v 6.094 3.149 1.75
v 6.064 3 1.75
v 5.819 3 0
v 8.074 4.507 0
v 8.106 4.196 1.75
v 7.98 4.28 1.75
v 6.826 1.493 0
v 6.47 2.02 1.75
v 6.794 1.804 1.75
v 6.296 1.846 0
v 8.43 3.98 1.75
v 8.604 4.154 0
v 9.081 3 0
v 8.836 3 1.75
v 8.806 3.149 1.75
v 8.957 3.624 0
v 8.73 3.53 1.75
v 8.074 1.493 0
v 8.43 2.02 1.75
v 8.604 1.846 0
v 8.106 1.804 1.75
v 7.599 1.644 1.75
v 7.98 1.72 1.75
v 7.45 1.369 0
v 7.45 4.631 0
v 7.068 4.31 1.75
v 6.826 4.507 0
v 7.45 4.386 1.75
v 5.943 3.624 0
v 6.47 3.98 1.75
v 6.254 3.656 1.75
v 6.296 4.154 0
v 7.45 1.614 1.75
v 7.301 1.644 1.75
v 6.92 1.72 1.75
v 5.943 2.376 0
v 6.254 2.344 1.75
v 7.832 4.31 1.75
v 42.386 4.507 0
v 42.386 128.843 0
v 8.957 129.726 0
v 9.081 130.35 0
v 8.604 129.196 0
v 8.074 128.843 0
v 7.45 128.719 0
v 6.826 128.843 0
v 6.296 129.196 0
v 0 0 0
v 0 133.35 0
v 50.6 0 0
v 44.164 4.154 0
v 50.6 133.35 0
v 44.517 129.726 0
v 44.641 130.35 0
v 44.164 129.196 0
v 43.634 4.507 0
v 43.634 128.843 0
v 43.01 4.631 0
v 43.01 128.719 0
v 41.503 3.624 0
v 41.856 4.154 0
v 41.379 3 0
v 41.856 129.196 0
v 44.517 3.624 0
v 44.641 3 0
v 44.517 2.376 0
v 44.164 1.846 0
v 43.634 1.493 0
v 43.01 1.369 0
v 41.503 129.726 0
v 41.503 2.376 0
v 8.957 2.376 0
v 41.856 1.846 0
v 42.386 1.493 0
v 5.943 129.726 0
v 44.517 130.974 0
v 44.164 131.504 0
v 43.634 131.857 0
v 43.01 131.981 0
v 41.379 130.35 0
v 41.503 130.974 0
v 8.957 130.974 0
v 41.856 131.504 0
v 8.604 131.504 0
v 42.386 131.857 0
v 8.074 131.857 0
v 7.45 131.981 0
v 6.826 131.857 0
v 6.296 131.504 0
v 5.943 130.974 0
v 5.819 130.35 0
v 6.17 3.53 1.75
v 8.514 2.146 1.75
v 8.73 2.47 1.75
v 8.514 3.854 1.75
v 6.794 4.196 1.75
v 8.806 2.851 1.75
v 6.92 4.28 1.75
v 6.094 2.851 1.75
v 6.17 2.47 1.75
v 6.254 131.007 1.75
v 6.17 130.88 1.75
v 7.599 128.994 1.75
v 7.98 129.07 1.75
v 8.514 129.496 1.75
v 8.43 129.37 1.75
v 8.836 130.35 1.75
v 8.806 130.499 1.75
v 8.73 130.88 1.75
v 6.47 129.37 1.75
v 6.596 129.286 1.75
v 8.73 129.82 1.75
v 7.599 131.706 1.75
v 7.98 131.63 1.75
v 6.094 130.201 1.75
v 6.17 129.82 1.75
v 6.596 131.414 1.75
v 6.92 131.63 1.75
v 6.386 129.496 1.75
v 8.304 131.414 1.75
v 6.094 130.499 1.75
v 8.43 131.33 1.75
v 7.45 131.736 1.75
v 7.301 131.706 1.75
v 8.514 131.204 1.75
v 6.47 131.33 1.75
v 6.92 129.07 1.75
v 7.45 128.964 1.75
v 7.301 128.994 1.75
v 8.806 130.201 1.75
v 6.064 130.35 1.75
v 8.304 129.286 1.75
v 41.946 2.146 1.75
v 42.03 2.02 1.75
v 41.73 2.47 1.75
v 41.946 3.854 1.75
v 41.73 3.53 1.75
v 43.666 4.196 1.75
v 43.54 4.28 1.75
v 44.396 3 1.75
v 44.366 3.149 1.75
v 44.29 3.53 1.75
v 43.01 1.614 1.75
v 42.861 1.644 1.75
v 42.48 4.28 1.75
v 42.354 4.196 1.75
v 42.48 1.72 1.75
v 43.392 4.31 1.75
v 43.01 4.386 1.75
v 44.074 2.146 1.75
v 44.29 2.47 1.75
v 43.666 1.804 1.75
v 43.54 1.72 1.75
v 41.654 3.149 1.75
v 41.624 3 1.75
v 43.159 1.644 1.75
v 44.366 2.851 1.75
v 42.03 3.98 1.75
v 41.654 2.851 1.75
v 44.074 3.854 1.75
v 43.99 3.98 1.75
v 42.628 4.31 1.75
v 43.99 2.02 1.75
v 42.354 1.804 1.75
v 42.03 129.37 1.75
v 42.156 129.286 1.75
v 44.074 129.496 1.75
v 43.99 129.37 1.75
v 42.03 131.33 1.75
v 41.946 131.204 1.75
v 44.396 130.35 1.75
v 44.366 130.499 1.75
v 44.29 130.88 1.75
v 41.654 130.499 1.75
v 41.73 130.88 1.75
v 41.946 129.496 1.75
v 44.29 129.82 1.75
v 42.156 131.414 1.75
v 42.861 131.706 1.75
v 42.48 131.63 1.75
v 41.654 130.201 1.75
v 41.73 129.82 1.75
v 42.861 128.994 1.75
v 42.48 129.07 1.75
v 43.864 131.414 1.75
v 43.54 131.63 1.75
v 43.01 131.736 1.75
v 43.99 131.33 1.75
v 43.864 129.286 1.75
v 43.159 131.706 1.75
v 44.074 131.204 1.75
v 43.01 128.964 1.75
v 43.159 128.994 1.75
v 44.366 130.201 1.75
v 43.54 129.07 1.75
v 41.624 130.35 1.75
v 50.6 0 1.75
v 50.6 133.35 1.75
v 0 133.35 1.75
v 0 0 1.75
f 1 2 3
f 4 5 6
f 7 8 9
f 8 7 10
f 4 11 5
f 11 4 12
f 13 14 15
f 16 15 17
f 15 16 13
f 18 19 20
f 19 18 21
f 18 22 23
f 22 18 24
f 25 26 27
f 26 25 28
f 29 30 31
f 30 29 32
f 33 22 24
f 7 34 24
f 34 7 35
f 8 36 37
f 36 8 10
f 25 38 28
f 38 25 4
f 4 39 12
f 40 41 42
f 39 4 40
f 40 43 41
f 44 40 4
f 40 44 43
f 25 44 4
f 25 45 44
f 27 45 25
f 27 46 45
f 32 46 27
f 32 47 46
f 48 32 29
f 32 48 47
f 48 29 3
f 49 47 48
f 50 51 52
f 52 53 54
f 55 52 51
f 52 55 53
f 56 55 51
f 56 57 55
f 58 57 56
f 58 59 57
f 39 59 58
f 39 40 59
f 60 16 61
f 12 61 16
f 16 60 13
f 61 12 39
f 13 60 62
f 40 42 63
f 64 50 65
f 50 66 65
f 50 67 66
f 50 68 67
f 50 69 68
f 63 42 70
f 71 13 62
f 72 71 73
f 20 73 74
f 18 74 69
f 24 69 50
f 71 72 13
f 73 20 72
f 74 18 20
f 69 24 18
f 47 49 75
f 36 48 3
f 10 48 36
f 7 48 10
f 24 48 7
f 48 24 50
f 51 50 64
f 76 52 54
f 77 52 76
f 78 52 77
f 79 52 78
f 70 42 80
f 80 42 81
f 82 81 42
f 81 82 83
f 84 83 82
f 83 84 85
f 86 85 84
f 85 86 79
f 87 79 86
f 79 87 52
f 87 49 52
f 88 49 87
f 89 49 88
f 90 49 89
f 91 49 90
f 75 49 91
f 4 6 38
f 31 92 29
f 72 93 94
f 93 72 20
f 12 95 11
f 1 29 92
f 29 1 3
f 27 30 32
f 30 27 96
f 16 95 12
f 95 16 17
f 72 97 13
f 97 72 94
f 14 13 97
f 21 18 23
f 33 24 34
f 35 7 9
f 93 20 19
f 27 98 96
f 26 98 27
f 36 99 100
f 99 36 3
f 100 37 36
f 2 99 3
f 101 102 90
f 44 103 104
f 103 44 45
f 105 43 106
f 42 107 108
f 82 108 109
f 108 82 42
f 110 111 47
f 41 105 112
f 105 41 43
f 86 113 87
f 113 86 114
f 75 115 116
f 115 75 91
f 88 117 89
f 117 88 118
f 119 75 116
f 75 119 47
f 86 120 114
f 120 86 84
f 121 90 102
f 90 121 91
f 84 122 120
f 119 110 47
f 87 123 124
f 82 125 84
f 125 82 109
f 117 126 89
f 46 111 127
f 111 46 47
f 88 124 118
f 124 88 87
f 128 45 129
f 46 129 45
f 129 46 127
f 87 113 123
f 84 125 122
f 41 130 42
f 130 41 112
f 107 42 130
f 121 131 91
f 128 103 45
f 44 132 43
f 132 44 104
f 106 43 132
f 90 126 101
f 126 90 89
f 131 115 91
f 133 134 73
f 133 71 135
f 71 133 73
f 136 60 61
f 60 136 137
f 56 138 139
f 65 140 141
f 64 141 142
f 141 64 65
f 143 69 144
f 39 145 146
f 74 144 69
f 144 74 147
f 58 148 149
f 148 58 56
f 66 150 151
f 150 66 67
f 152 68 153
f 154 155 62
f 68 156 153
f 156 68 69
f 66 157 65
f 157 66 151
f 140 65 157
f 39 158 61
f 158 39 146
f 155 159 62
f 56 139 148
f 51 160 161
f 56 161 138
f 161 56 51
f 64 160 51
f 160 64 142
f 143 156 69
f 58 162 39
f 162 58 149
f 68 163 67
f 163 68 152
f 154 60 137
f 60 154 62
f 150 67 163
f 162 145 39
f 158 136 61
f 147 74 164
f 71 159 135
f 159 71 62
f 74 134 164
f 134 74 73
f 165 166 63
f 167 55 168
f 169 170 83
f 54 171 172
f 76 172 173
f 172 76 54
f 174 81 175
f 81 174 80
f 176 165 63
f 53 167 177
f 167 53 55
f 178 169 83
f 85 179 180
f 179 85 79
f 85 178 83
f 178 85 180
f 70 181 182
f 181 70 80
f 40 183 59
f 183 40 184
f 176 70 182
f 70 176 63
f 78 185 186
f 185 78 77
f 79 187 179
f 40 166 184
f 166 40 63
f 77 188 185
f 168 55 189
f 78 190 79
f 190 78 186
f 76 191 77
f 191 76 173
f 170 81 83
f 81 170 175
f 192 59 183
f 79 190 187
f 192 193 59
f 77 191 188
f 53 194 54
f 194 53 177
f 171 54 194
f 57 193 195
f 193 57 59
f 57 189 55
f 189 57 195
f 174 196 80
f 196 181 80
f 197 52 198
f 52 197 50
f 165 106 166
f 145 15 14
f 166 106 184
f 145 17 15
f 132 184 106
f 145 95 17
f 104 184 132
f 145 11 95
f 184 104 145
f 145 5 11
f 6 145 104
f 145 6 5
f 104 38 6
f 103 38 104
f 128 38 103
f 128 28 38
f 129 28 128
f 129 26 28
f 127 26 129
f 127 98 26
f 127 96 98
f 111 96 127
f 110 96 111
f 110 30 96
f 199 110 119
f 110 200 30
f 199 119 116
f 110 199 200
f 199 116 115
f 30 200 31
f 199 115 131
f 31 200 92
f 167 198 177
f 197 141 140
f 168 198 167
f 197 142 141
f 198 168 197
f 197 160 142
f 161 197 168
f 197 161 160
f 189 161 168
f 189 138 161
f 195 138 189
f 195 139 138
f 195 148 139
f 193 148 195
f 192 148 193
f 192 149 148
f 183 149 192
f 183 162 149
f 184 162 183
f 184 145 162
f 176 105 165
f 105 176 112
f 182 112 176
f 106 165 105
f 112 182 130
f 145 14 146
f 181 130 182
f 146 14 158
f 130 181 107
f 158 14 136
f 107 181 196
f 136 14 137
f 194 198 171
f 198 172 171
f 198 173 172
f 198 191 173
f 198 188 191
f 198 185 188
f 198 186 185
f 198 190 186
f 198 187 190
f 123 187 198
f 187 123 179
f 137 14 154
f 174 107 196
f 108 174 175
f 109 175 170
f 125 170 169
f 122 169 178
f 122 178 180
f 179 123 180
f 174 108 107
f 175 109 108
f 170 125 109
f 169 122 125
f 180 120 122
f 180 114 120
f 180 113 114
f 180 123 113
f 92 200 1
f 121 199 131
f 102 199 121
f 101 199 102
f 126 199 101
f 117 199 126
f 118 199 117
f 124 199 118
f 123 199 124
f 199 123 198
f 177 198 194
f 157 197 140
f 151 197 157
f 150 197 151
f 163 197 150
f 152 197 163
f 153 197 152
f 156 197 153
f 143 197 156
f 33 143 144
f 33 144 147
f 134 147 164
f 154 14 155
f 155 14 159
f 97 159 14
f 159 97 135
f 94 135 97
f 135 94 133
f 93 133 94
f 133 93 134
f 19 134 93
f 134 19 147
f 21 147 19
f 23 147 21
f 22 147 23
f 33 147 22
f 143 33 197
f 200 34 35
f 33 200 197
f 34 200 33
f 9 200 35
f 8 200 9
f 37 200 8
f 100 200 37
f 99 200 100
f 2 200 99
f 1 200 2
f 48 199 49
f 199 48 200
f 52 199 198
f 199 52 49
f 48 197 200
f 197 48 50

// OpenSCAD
 module cylinderOuter(height, radius, fn) {
   fudge = 1/cos(180/fn);
   cylinder(height, radius*fudge, $fn=fn);
 }


module drawPanel(n=2) {
    height = 133.35;
    horizontal_pitch = 5.08;
    hole_radius = 1.6;
    depth = 1.75;

    function width(incr, hp) = (incr * hp) - 0.2;

    function hole_center_x(incr, hp) = 7.45 + (incr * hp);
    function hole_center_y(h) = abs(h - 3);

    holes = [
        [hole_center_x(0, horizontal_pitch), hole_center_y(0)],  // bottom left
        [hole_center_x(0, horizontal_pitch), hole_center_y(height)], // top left
        [hole_center_x((n-3), horizontal_pitch), hole_center_y(0)], // bottom right
        [hole_center_x((n-3), horizontal_pitch), hole_center_y(height)]  // top right
    ];
    
    difference() {
        cube([width(n, horizontal_pitch), height, depth]);
        for (hole = holes)
            translate([hole.x, hole.y, 0])
                cylinderOuter((depth*2) + 1, hole_radius, 16);
    }
}

drawPanel(10);
